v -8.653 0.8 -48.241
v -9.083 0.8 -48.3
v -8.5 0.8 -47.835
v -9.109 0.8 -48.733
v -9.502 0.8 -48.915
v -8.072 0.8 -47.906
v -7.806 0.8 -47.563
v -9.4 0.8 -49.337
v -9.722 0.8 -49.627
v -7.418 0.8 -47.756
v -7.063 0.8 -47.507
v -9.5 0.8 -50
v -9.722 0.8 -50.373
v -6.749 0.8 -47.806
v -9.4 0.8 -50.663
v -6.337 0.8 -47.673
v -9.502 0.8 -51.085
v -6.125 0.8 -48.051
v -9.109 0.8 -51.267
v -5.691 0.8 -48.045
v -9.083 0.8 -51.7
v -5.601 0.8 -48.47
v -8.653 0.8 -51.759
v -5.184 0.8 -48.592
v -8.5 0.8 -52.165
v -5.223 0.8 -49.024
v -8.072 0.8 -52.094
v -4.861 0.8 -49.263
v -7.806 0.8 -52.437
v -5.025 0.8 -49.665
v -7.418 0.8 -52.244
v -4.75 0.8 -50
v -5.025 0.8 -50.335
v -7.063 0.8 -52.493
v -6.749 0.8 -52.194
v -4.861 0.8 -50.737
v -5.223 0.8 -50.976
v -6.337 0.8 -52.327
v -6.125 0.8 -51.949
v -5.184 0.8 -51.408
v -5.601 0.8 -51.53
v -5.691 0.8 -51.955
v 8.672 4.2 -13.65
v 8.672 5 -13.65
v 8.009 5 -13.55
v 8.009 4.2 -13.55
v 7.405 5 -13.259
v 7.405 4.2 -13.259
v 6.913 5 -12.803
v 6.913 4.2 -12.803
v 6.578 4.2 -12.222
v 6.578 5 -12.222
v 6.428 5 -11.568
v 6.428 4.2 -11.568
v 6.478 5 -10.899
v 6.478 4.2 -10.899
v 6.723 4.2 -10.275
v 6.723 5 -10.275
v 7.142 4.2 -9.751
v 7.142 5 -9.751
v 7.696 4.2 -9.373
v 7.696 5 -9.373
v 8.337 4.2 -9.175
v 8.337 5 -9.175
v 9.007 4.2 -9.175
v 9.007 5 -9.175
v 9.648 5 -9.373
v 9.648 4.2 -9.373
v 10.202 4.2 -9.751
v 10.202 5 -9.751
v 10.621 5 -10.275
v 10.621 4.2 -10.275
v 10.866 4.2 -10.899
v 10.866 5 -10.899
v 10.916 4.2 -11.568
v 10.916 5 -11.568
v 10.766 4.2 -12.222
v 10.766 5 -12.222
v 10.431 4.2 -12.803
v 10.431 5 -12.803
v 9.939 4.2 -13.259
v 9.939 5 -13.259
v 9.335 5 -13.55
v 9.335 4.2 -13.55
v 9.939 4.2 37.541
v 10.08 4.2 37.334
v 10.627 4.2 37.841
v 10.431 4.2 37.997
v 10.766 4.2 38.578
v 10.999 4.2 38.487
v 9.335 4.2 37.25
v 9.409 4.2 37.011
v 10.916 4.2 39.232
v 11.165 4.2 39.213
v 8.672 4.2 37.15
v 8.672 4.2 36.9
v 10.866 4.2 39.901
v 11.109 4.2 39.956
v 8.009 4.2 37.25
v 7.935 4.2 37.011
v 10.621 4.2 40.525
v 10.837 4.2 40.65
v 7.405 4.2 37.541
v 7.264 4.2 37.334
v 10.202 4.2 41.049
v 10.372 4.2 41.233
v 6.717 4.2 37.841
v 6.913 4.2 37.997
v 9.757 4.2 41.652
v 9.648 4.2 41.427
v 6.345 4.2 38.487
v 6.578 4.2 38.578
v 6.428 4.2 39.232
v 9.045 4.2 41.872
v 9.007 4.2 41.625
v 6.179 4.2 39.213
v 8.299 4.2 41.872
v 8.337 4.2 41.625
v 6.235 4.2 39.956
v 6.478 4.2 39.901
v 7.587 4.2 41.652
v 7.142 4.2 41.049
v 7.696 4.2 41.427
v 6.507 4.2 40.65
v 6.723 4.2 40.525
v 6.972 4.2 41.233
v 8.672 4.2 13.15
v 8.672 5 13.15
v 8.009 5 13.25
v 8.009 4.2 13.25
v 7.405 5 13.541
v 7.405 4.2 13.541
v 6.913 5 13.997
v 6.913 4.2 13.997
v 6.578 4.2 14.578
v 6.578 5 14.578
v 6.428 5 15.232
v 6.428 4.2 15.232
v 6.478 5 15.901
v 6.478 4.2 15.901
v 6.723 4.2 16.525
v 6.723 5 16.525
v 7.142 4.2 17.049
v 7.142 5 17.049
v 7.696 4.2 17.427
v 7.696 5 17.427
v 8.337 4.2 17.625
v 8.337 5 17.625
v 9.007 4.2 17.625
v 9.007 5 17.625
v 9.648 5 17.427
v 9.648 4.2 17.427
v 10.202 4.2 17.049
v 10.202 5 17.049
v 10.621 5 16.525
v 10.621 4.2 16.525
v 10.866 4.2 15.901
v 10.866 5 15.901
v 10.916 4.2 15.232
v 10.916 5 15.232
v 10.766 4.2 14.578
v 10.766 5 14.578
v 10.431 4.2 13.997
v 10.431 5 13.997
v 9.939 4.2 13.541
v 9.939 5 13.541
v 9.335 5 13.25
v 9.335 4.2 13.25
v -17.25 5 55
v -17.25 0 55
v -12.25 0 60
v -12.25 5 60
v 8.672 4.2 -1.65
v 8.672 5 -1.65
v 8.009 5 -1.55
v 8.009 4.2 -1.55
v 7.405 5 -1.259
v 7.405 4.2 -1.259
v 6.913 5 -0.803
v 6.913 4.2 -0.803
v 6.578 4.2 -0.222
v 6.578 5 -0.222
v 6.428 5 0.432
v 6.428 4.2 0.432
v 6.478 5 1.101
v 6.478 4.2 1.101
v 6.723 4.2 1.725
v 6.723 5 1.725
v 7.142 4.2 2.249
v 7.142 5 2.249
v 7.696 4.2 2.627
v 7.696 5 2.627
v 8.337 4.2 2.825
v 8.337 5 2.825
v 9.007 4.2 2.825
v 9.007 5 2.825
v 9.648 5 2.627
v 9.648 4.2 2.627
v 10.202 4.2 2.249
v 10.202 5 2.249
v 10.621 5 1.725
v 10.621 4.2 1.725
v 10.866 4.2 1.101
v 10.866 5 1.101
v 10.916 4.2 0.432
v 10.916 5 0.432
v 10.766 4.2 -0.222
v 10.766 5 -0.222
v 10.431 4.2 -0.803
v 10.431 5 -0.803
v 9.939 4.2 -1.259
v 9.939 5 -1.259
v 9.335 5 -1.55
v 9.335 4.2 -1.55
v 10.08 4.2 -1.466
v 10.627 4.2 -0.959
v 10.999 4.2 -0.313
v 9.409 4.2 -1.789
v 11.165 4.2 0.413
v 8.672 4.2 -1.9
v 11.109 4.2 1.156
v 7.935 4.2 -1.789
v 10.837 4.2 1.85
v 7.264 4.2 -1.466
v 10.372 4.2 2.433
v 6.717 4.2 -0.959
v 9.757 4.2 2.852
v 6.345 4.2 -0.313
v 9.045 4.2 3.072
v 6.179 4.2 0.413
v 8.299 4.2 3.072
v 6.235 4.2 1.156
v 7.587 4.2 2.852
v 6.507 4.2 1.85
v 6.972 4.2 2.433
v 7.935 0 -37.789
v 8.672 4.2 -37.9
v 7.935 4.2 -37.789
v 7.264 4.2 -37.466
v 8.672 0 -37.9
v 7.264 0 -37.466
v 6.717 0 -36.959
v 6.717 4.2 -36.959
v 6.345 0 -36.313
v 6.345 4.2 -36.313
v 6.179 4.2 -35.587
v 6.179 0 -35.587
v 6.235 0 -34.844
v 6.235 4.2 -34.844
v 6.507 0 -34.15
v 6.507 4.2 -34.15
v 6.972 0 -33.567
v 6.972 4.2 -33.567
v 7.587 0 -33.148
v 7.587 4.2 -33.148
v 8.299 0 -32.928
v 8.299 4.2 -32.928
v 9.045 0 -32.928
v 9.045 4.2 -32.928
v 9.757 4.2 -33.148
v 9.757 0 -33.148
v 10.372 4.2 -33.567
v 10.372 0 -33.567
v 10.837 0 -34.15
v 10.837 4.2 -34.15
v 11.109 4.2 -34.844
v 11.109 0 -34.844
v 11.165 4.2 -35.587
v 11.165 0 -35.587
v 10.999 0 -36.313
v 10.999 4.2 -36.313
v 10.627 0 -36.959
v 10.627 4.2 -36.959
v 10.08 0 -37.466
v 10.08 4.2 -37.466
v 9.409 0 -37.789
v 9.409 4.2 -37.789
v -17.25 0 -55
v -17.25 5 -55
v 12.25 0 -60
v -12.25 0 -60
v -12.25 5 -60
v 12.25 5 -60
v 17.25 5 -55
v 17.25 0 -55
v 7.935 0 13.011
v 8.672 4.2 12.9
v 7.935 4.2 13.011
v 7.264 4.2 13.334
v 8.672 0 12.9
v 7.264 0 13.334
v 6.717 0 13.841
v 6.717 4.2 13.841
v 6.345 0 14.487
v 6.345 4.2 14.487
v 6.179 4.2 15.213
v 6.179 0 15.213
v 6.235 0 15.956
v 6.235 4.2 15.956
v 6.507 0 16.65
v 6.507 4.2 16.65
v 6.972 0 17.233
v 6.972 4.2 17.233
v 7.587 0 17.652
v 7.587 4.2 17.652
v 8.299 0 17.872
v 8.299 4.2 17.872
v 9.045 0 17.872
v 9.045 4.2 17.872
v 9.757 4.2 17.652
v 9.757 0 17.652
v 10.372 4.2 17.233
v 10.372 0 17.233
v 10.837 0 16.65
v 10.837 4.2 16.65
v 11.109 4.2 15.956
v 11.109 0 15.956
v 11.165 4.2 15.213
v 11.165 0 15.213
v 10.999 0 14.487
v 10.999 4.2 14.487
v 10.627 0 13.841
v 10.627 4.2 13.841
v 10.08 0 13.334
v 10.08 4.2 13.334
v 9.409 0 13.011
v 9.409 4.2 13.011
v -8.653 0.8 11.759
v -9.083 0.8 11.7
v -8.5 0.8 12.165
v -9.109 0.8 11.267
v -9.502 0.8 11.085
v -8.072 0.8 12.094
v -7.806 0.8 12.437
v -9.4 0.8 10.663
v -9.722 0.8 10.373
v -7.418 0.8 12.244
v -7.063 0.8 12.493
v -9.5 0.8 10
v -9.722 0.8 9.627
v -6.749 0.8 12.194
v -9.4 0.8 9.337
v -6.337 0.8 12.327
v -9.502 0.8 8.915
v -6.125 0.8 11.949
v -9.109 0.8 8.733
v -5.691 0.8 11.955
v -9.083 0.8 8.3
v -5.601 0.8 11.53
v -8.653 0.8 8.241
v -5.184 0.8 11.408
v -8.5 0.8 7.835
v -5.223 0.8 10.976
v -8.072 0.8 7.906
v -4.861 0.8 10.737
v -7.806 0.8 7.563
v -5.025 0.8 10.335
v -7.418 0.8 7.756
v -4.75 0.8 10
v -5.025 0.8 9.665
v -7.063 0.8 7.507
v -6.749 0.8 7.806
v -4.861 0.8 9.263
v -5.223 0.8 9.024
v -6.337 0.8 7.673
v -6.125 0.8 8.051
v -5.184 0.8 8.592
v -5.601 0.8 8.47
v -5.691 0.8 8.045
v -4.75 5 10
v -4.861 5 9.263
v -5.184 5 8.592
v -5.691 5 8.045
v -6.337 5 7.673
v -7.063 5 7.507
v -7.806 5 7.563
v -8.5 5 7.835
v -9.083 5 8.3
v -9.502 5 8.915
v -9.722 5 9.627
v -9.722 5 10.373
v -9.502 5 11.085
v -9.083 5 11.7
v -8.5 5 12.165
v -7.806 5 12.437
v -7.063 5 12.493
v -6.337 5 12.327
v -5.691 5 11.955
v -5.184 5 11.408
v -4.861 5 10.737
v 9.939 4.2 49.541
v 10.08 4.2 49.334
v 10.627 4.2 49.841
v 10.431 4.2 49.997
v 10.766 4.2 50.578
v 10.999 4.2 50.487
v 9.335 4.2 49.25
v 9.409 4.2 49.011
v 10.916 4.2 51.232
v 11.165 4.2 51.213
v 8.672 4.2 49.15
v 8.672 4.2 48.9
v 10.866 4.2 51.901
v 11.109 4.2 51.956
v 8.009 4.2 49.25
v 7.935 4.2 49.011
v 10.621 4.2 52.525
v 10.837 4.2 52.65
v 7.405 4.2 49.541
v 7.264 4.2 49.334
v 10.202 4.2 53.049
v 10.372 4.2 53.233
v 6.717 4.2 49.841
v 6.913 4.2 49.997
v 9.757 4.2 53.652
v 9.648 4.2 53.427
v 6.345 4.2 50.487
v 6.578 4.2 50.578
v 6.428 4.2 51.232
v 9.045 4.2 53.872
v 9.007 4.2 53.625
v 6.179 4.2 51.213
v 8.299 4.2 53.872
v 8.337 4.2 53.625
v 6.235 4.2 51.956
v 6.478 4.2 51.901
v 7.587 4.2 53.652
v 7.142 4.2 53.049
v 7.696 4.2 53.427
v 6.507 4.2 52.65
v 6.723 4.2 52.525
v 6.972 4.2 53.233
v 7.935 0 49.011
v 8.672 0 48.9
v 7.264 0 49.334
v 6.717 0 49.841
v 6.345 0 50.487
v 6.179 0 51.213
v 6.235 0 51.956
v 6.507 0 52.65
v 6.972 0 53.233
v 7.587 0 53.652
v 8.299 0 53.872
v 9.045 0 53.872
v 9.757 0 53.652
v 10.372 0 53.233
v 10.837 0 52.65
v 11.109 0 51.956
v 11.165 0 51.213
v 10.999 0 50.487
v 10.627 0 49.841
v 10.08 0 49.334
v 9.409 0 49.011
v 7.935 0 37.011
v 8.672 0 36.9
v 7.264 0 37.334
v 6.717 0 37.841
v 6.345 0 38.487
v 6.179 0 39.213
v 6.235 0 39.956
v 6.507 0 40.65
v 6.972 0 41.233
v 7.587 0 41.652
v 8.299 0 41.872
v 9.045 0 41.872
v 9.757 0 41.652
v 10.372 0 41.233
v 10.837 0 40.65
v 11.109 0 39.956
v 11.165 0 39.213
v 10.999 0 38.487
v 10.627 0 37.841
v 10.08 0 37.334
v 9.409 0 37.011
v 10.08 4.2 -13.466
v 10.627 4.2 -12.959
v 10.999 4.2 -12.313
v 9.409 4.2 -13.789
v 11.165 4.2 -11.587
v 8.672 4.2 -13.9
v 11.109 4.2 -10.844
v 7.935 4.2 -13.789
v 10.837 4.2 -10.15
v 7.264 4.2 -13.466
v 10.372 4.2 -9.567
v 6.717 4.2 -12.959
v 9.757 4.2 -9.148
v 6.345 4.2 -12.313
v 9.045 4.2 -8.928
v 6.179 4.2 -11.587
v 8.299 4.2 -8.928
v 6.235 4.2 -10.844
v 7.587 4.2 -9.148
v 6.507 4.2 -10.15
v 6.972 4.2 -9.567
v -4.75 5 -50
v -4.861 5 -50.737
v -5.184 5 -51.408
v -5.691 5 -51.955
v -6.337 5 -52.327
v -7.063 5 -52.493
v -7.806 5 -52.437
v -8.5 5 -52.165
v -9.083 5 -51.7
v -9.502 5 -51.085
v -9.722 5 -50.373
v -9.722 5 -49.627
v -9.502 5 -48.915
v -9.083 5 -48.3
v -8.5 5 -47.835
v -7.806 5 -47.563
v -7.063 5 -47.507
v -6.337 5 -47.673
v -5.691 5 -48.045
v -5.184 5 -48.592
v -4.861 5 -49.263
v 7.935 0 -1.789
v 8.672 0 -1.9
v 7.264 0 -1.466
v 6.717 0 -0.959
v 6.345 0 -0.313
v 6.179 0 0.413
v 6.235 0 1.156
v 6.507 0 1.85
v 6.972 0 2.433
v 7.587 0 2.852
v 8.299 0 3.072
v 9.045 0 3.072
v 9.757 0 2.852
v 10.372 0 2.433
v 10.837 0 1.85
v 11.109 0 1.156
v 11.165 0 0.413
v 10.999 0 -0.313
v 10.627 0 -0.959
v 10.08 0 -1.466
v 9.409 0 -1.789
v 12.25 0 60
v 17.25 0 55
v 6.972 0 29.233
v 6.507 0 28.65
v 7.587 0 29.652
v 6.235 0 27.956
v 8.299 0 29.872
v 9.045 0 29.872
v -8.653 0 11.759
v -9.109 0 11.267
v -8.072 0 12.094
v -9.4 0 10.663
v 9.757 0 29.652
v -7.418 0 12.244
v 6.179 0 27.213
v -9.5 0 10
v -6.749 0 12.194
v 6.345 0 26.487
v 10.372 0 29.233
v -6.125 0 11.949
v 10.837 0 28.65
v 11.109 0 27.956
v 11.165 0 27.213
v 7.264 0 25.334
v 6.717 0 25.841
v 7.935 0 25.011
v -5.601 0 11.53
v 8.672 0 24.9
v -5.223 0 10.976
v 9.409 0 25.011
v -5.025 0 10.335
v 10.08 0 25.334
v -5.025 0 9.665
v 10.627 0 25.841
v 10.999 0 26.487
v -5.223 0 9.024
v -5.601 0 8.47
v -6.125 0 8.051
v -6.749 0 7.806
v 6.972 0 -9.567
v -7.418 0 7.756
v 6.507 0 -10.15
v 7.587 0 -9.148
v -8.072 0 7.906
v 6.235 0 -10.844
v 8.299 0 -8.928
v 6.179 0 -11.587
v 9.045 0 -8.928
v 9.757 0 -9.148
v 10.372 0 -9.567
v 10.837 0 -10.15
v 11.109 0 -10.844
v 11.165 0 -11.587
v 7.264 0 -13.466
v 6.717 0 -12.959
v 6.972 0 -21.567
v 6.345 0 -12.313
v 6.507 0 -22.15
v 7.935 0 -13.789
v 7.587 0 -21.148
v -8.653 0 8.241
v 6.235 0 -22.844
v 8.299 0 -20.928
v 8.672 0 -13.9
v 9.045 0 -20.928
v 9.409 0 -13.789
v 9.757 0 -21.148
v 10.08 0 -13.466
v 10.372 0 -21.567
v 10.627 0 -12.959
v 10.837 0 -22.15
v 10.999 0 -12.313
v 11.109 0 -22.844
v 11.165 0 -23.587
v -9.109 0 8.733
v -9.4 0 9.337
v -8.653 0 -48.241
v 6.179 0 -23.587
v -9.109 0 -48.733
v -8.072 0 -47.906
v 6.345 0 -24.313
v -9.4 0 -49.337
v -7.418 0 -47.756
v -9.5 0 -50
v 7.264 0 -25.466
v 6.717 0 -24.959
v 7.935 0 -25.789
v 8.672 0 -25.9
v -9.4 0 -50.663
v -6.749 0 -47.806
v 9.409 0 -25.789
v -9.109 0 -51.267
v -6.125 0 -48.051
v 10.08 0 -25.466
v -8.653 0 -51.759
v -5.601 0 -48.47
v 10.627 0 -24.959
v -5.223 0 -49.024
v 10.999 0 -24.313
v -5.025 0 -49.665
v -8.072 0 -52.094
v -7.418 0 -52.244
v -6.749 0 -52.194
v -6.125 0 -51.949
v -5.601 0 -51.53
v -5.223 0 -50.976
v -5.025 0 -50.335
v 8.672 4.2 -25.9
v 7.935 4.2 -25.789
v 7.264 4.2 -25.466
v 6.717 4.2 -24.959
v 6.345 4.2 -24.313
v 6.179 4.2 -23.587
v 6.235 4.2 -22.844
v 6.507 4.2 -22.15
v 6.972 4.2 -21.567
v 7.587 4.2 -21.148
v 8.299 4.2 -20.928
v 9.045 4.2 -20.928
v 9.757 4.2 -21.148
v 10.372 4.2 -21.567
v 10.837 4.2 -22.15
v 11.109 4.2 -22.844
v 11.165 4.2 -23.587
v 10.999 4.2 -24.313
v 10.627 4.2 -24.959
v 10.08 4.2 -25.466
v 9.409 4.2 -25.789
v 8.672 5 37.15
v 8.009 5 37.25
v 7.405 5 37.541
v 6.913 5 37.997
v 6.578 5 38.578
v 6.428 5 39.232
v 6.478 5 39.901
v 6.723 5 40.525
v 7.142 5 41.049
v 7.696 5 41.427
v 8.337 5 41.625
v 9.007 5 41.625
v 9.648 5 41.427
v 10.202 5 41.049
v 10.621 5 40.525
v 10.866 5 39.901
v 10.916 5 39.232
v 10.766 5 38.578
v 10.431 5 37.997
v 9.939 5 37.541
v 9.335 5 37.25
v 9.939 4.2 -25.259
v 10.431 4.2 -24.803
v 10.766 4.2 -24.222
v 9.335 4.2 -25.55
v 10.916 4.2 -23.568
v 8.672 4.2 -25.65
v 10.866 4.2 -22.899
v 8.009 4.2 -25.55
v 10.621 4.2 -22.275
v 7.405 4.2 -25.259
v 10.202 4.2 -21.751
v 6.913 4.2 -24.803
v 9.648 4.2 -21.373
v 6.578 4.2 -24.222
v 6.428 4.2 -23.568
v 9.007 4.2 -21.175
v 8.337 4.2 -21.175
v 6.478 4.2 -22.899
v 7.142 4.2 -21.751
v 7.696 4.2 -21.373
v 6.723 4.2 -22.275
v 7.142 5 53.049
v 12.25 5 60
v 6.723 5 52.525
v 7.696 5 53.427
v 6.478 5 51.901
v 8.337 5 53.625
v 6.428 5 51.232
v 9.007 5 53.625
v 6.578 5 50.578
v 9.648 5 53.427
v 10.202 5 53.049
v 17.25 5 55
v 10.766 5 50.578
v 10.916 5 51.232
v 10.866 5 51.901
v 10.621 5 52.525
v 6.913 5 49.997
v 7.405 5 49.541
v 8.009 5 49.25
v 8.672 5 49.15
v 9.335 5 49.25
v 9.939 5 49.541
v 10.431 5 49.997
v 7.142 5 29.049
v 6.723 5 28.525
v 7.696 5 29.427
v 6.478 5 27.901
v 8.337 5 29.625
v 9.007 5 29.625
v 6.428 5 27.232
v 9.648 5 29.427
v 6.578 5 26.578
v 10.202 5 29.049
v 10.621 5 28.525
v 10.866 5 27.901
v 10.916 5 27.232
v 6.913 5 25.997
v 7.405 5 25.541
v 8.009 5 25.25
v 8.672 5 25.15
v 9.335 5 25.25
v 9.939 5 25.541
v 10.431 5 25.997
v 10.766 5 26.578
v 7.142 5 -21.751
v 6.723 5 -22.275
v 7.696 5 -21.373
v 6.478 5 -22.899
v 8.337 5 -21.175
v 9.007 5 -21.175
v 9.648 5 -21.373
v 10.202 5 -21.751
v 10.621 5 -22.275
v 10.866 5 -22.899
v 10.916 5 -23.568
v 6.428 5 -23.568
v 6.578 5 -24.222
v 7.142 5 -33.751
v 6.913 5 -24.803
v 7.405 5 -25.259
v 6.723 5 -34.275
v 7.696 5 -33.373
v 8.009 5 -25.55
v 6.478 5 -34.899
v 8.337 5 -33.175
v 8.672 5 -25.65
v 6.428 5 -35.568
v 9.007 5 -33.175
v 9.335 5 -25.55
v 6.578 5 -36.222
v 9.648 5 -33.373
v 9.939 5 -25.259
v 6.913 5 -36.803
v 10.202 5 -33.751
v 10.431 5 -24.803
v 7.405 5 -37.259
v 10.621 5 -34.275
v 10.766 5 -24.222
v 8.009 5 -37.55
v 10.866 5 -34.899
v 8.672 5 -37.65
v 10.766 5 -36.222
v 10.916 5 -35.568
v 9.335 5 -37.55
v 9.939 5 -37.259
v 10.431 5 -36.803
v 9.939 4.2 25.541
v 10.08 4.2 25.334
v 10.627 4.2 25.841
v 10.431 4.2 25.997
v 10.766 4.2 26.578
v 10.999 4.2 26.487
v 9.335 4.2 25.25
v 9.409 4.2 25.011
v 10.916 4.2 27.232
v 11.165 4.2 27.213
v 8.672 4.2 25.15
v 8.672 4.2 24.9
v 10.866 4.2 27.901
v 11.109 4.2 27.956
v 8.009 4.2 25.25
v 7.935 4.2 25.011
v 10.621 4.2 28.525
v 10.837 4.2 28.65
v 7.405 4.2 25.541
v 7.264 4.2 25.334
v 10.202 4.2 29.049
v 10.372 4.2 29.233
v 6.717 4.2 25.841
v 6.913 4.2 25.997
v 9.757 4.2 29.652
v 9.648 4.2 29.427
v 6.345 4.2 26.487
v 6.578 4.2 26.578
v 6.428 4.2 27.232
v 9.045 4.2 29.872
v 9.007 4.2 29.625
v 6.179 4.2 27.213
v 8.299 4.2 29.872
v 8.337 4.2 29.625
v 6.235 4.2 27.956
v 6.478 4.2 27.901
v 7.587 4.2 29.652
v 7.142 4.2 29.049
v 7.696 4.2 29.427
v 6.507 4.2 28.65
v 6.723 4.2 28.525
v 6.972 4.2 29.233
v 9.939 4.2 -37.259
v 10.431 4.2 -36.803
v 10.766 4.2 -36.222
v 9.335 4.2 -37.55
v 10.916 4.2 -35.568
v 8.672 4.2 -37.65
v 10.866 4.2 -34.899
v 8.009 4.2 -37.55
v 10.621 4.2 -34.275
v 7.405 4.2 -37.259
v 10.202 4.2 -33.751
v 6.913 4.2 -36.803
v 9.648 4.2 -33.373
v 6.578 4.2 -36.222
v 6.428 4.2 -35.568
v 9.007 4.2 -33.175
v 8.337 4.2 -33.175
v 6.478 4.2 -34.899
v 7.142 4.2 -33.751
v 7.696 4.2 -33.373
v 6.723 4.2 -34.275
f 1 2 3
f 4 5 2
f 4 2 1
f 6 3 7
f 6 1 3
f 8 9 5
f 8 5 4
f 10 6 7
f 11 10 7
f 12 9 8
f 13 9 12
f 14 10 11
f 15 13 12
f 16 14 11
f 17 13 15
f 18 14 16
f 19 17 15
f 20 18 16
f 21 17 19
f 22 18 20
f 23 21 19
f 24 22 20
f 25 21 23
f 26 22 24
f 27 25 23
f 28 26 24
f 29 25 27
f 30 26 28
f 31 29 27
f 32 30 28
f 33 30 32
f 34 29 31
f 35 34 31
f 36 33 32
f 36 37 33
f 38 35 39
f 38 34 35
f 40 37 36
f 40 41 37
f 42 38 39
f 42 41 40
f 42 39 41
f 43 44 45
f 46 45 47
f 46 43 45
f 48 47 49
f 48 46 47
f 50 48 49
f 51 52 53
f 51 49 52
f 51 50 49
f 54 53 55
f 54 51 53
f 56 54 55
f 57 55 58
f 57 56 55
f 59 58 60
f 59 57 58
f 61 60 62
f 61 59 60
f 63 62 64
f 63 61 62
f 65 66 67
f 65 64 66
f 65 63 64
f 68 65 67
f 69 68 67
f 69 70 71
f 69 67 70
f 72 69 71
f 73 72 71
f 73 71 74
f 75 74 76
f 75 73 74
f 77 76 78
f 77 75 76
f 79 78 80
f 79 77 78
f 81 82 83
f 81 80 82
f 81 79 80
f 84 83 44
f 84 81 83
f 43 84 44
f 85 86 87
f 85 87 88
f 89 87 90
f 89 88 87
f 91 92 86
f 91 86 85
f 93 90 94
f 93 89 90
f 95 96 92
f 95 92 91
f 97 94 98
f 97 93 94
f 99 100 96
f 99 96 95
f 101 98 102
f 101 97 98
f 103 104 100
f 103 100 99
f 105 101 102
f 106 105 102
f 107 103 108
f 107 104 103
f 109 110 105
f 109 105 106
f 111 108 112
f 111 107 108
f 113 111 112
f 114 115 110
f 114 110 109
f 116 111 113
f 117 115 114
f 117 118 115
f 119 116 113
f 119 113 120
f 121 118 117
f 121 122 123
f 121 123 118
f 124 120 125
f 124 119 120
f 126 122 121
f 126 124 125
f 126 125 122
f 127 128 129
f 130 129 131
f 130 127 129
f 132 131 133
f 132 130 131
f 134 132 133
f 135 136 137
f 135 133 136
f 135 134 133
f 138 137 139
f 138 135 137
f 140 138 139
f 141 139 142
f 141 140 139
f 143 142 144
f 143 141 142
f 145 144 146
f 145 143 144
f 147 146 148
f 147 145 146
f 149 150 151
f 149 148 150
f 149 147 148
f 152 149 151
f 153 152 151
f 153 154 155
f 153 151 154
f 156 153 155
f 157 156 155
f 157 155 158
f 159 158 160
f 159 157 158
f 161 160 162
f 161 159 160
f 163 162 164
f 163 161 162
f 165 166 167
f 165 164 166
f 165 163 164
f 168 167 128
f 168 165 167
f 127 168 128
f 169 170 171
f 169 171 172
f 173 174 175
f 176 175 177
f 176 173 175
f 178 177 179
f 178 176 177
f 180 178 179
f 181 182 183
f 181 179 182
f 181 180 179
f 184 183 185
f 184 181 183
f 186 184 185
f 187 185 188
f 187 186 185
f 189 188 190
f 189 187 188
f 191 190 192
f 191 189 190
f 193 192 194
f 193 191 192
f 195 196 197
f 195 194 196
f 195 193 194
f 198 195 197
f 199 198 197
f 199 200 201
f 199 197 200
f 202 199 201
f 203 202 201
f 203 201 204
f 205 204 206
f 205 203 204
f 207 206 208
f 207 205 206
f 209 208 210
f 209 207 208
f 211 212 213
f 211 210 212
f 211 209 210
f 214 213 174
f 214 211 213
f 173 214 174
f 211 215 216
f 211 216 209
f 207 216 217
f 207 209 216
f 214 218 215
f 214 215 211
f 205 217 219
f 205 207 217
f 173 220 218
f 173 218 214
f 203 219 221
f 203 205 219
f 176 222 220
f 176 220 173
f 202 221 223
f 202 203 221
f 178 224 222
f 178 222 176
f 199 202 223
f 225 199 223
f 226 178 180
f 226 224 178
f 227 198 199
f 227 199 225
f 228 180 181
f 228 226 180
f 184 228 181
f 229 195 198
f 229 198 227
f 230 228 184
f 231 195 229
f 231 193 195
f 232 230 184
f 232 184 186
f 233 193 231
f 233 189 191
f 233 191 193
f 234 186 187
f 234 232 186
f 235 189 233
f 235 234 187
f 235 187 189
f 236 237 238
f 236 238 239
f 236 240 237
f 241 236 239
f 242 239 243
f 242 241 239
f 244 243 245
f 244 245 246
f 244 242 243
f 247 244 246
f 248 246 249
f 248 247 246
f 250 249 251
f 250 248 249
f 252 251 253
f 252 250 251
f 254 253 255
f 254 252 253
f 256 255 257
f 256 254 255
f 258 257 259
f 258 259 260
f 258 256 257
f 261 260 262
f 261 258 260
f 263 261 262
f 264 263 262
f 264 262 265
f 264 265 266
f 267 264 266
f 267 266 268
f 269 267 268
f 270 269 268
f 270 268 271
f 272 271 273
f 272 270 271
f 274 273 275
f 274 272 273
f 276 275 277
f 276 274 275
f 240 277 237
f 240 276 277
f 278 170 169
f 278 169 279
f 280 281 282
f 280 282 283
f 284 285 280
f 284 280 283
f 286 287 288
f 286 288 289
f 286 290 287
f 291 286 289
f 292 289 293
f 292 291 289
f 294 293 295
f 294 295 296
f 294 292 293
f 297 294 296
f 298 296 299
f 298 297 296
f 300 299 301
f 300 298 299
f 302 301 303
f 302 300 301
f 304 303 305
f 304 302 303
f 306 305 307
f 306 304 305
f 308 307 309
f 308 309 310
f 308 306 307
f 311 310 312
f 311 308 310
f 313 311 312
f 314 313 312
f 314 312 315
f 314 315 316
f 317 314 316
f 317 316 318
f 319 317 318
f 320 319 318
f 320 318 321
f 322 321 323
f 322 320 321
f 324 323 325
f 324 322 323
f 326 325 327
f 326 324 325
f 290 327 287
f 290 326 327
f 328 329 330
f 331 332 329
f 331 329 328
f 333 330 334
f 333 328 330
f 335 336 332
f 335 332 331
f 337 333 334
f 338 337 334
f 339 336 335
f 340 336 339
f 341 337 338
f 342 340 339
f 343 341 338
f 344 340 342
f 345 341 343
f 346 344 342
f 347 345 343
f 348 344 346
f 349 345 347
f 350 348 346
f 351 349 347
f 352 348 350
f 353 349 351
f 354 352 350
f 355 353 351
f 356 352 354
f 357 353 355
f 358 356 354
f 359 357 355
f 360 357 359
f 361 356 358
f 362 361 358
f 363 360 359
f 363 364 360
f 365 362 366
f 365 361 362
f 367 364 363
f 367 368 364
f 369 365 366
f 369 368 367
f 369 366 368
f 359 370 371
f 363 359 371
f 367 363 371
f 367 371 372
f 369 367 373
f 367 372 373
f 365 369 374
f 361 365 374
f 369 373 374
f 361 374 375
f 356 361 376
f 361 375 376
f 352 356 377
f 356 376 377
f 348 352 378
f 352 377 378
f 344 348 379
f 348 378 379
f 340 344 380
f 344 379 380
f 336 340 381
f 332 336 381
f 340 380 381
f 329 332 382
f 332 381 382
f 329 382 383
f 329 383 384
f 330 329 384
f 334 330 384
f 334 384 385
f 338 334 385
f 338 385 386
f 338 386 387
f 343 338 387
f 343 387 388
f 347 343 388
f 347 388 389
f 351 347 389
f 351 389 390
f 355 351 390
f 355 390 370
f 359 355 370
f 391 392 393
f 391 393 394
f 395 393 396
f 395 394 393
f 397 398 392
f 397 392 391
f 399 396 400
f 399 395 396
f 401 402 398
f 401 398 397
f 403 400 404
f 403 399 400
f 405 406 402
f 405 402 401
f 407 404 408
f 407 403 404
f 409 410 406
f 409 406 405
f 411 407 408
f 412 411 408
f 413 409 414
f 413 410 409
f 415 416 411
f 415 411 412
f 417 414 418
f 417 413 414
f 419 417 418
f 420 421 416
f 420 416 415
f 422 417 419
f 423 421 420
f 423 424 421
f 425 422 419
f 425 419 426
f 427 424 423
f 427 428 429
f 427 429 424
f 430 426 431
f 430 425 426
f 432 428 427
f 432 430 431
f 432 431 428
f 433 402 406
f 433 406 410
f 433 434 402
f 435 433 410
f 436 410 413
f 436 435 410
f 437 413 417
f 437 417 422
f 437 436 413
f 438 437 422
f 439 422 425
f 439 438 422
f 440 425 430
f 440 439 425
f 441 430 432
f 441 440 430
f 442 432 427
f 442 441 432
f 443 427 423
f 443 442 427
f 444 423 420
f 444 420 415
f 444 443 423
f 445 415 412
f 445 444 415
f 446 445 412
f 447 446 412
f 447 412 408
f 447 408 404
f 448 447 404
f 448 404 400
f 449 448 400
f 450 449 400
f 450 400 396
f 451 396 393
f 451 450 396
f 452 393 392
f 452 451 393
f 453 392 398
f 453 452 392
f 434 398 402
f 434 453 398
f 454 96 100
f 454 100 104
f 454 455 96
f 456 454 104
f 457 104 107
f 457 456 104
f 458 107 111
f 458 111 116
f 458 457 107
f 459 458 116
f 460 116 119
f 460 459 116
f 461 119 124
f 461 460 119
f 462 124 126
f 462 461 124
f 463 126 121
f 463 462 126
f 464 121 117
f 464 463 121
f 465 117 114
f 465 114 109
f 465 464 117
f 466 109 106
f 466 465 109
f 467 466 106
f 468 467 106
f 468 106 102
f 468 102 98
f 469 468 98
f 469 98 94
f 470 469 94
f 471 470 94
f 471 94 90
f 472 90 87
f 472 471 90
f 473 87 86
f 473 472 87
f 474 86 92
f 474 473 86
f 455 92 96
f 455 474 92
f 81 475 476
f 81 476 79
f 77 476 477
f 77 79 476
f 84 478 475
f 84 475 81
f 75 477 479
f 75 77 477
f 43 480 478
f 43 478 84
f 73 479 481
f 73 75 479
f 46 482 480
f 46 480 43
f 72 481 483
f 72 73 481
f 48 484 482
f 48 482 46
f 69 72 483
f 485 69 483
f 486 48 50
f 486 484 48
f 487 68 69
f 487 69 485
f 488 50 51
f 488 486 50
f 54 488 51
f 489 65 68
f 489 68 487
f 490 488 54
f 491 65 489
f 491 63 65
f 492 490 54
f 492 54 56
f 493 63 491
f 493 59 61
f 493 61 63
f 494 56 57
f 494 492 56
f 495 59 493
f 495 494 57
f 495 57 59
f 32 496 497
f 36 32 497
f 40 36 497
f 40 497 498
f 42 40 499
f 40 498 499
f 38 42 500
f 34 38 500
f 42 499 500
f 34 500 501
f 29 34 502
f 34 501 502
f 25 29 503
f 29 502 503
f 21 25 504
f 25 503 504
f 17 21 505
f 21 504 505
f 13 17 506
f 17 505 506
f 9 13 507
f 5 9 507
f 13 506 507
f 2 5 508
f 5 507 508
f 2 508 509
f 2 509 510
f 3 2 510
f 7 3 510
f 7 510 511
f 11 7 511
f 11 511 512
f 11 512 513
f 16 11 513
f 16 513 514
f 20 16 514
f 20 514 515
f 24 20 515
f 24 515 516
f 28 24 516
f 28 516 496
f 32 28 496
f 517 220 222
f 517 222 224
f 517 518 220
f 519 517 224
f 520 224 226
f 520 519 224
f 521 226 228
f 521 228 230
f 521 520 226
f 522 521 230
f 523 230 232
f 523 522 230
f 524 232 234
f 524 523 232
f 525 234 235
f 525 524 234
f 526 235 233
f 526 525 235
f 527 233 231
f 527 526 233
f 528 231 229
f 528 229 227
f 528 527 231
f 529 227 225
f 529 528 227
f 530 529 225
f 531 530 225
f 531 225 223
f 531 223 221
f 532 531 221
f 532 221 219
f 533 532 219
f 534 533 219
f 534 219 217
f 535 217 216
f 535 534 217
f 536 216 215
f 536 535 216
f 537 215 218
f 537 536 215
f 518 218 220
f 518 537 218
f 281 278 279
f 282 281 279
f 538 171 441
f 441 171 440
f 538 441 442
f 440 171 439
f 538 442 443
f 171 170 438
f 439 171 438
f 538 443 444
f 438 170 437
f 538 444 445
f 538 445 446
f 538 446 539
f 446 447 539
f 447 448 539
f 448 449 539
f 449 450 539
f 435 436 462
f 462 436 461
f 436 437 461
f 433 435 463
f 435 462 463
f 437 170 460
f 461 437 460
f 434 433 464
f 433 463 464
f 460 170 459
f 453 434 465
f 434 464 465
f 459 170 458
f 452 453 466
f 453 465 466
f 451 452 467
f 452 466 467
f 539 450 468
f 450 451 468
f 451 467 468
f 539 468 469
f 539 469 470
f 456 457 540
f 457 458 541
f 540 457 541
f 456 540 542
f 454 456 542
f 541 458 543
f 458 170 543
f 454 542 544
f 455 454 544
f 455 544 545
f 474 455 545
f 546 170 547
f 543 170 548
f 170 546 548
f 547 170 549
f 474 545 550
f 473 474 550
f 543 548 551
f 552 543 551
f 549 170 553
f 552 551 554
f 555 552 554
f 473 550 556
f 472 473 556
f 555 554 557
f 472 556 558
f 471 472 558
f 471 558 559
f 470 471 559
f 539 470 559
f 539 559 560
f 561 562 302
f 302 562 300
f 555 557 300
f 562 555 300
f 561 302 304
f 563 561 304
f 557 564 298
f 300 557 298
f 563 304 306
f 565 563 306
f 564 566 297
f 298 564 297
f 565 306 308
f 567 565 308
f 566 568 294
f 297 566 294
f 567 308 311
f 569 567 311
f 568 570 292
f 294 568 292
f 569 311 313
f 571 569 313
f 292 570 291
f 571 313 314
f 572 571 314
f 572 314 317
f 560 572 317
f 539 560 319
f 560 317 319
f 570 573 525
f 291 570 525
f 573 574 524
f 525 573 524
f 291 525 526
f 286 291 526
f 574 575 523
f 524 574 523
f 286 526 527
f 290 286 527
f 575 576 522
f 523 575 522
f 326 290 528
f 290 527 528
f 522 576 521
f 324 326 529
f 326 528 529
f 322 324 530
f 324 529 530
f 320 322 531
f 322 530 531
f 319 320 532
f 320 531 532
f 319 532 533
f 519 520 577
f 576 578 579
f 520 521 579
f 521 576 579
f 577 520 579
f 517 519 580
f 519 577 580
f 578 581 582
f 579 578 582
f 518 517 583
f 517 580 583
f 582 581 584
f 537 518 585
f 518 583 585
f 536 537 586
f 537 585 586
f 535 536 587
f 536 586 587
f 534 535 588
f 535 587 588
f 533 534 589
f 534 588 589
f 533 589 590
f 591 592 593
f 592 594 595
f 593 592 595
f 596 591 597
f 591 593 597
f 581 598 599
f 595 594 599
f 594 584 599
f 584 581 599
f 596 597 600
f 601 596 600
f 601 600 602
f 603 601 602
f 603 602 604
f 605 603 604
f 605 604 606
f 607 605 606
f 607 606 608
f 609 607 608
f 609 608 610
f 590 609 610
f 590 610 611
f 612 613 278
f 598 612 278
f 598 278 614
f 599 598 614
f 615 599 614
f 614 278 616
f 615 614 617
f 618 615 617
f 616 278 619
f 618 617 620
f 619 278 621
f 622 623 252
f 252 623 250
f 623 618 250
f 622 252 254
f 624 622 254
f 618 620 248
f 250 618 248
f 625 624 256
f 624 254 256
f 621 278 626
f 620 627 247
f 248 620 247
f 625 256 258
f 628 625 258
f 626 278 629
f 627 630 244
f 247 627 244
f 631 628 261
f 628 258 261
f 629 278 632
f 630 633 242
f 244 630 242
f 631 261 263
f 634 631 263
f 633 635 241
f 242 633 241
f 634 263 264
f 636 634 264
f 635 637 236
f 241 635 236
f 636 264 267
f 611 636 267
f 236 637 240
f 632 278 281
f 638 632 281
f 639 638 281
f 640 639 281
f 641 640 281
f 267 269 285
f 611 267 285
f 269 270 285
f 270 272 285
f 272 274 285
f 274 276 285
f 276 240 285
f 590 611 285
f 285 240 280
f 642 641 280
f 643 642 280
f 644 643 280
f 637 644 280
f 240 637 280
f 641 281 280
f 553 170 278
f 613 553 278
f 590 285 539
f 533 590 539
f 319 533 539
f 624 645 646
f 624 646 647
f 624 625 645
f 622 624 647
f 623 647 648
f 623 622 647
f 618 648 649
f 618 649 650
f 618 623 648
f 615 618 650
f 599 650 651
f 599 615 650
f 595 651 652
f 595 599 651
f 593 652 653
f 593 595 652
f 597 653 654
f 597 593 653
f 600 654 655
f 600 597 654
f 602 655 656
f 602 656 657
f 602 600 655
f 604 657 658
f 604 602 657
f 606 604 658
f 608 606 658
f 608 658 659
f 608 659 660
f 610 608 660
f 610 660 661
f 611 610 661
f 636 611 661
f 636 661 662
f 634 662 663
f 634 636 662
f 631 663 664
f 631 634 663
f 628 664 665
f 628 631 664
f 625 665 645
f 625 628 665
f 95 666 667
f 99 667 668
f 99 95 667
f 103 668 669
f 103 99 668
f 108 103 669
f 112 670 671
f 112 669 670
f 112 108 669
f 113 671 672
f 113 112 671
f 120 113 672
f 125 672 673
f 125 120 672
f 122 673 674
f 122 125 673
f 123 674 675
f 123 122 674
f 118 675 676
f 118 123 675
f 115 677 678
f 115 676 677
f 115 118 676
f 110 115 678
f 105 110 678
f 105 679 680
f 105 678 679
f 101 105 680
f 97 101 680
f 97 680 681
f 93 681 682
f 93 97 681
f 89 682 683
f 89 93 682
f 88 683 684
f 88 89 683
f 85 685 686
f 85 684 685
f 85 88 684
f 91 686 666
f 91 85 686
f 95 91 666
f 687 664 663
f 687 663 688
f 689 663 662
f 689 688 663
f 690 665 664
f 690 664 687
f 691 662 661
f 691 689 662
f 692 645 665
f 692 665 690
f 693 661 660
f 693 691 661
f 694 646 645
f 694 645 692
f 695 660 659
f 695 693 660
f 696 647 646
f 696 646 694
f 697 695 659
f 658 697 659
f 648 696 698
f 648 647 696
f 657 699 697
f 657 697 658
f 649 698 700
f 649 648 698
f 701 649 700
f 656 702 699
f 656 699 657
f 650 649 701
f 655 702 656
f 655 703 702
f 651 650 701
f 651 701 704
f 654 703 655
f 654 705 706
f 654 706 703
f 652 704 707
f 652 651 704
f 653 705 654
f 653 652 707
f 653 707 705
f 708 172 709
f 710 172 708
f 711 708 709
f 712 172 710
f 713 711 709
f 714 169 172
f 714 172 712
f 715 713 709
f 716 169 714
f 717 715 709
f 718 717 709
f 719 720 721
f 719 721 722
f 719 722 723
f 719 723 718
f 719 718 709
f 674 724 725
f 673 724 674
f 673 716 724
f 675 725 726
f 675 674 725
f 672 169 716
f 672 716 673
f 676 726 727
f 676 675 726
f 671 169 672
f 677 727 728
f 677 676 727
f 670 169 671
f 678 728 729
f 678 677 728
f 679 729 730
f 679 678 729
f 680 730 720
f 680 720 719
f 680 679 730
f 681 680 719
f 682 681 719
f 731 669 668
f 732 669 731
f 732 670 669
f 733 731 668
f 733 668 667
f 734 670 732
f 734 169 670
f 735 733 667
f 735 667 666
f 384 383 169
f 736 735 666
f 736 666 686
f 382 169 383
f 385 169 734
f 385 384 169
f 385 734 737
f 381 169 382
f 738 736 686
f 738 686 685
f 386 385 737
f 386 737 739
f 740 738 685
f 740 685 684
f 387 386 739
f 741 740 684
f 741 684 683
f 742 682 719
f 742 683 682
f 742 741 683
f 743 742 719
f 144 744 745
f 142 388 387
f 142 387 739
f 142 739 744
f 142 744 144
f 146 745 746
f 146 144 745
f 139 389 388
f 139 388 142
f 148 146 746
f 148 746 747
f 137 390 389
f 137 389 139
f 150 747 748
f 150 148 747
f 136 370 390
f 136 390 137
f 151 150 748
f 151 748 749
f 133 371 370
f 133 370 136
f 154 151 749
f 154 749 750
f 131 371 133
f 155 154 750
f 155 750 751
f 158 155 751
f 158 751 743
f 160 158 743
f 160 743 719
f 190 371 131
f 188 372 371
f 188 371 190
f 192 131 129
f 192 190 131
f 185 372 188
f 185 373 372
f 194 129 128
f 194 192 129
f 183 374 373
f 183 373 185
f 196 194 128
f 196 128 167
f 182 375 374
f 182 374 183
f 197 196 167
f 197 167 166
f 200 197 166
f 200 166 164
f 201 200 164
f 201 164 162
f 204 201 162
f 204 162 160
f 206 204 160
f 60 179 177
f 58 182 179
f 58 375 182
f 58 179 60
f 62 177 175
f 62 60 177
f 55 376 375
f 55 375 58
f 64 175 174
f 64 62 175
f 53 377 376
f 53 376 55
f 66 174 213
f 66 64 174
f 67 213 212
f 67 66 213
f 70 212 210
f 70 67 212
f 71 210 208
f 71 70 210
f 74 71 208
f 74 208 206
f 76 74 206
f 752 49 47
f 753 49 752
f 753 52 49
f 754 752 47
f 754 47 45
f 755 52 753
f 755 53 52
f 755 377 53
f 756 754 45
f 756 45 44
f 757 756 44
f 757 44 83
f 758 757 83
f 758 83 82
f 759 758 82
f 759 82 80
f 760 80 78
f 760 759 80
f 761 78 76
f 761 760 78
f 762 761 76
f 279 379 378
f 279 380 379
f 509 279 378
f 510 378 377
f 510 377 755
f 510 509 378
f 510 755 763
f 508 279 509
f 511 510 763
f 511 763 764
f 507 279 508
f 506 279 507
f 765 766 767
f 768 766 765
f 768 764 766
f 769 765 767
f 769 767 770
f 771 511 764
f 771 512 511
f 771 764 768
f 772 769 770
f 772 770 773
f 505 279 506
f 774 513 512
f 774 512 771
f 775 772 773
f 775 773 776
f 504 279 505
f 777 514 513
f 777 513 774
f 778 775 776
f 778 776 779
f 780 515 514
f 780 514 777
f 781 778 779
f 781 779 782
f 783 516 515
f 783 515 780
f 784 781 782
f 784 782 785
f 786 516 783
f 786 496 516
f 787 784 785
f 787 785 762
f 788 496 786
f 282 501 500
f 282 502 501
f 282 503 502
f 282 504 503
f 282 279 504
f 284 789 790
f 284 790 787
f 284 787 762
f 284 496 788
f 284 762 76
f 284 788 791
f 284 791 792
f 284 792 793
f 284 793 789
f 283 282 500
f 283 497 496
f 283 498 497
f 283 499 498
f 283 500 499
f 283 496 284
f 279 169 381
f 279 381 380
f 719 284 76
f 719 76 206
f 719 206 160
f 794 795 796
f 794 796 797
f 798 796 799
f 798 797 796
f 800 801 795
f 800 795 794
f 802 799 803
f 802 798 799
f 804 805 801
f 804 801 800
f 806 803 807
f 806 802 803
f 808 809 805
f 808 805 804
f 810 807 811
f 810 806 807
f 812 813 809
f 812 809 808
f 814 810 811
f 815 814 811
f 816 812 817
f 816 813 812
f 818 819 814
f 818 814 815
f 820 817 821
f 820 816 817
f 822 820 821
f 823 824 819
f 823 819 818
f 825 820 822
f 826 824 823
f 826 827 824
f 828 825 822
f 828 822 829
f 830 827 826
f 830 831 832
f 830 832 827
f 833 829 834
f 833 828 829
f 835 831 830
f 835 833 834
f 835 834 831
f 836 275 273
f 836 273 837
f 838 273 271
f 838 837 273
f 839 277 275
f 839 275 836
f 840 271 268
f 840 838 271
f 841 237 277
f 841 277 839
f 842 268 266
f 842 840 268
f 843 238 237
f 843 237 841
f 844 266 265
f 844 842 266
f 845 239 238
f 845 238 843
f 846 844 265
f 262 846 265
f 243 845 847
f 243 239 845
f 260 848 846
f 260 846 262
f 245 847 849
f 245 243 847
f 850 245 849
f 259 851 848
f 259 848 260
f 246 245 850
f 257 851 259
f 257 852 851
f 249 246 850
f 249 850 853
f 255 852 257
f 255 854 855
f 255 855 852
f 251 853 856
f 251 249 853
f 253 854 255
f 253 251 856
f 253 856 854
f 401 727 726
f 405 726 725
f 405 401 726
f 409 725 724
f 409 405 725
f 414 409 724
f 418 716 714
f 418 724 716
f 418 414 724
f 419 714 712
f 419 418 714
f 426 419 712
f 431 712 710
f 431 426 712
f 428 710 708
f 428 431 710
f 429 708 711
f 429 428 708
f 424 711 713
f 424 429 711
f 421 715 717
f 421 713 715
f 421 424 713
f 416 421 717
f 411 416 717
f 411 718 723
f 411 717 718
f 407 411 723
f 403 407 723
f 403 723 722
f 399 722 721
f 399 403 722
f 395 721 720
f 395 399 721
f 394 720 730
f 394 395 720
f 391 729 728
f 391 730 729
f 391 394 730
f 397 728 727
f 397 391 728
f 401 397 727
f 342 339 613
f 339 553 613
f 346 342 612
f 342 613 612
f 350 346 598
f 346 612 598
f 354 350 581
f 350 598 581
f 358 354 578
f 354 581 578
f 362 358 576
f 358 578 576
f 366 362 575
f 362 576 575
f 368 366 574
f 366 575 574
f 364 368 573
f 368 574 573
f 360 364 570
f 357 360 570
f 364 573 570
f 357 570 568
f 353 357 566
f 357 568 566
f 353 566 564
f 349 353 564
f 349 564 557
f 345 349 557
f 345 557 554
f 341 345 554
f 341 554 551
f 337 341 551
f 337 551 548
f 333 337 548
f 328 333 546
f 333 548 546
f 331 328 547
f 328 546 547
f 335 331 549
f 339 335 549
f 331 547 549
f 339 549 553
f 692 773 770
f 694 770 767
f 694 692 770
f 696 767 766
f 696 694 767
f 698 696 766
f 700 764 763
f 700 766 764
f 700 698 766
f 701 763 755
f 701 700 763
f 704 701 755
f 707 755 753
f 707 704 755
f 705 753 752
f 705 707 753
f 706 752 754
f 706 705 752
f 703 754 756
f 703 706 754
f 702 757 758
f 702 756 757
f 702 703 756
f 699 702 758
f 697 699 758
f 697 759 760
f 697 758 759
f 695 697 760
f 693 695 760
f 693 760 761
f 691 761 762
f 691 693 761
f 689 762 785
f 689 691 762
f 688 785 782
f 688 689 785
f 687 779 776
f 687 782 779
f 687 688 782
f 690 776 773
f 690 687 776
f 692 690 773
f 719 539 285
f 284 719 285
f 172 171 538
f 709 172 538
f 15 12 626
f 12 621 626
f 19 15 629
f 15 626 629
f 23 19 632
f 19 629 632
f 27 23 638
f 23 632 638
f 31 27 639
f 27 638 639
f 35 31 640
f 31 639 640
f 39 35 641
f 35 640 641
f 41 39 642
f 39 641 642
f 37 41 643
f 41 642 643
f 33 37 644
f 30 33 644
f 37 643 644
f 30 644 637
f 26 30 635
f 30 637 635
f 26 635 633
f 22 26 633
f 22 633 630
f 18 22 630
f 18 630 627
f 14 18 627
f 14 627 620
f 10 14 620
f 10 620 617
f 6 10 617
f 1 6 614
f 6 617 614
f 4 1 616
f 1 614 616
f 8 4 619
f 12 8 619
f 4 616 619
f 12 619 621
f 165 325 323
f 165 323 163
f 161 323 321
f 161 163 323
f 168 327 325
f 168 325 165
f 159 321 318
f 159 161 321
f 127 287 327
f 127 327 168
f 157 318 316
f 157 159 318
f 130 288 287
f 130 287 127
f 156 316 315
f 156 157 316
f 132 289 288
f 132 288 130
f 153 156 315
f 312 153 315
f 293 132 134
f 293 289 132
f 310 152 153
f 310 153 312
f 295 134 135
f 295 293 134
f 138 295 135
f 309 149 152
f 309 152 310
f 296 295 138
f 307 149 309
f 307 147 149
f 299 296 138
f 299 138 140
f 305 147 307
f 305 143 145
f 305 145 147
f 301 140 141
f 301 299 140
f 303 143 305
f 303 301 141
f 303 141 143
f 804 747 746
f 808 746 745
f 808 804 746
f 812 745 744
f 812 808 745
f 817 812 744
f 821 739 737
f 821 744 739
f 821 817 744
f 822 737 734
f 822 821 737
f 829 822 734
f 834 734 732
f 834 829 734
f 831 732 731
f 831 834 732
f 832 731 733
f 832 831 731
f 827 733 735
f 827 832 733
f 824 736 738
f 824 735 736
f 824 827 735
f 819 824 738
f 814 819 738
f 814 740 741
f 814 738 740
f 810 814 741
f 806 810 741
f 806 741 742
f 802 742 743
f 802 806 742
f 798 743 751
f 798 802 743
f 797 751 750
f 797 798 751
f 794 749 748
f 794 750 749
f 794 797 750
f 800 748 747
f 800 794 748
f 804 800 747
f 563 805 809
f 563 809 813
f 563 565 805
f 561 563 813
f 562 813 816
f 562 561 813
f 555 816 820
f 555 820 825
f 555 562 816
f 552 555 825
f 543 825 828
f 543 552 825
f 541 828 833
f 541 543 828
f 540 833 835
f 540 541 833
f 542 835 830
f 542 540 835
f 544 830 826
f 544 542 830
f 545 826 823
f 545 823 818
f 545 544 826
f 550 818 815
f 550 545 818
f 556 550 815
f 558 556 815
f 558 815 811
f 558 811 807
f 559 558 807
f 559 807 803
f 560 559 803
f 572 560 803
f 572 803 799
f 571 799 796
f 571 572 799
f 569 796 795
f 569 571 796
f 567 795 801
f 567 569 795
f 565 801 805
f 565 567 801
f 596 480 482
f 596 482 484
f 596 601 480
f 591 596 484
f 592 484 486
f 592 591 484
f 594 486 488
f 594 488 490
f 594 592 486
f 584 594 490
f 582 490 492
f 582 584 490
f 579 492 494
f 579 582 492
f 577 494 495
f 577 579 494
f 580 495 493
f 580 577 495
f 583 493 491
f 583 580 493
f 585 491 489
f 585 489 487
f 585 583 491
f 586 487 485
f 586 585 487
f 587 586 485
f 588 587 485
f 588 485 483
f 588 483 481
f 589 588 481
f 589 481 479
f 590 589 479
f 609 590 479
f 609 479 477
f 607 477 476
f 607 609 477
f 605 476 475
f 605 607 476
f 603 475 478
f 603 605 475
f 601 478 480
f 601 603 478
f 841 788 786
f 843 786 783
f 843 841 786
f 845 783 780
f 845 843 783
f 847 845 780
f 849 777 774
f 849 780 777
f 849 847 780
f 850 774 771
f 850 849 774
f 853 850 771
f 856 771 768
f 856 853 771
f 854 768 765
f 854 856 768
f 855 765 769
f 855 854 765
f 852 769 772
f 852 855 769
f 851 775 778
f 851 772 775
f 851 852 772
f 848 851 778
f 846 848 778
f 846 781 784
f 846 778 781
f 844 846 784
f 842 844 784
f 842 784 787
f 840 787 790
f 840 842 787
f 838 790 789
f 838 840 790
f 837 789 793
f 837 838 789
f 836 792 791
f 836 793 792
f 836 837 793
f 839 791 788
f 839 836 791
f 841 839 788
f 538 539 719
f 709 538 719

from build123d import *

# Parameters (mm, degrees)
SKETCH1_W                                        = 34.5
SKETCH1_H                                        = 120
BOSS_EXTRUDE1_DEPTH                              = 5
CBORE_FOR_M4_HEX_HEAD_MACHINE_SCREW2_D           = 4.5
CBORE_FOR_M4_HEX_HEAD_MACHINE_SCREW2_DEPTH       = 12
CBORE_FOR_M4_HEX_HEAD_MACHINE_SCREW2_CBORE_D     = 5
CBORE_FOR_M4_HEX_HEAD_MACHINE_SCREW2_CBORE_DEPTH = 4.2
CBORE_FOR_M4_HEX_HEAD_MACHINE_SCREW2_TIP         = 1.351936393
CBORE_FOR_M4_HEX_HEAD_MACHINE_SCREW3_AT_COUNT    = 2
CBORE_FOR_M4_HEX_HEAD_MACHINE_SCREW3_AT_PITCH    = 50.8
LPATTERN1_COUNT                                  = 4
LPATTERN1_PITCH                                  = 12
CHAMFER1_SIZE                                    = 5


with BuildPart() as part:
    # Sketch1 → Boss-Extrude1 (new body)
    with BuildSketch(Plane(origin=(0, 0, 0), x_dir=(1, 0, 0), z_dir=(0, 1, 0))):
        Rectangle(SKETCH1_W, SKETCH1_H)
    extrude(amount=BOSS_EXTRUDE1_DEPTH)

    # CBORE for M4 Hex Head Machine Screw2
    with Locations(Plane(origin=(0, 5, 0), x_dir=(1, 0, 0), z_dir=(0, 1, 0))):
        with Locations((-7.25, 50), (-7.25, -10)):
            CounterBoreHole(CBORE_FOR_M4_HEX_HEAD_MACHINE_SCREW2_D / 2, CBORE_FOR_M4_HEX_HEAD_MACHINE_SCREW2_CBORE_D / 2, CBORE_FOR_M4_HEX_HEAD_MACHINE_SCREW2_CBORE_DEPTH, depth=CBORE_FOR_M4_HEX_HEAD_MACHINE_SCREW2_DEPTH)
            with Locations((0, 0, -(CBORE_FOR_M4_HEX_HEAD_MACHINE_SCREW2_DEPTH + CBORE_FOR_M4_HEX_HEAD_MACHINE_SCREW2_TIP / 2))):  # 118° drill point
                Cone(0, CBORE_FOR_M4_HEX_HEAD_MACHINE_SCREW2_D / 2, CBORE_FOR_M4_HEX_HEAD_MACHINE_SCREW2_TIP, mode=Mode.SUBTRACT)

    # Sketch6 → CBORE for M4 Hex Head Machine Screw3 (revolve, cut)
    with BuildSketch(Plane(origin=(8.672, 0, -35.4), x_dir=(0, 0, -1), z_dir=(1, 0, 0))):
        Polygon((0, 0), (0, 13.351936393), (2.25, 12), (2.25, 4.2), (2.5, 4.2), (2.5, 0), align=None)
    cbore_for_m4_hex_head_machine_screw3 = revolve(axis=Axis((8.672, -6.35, -35.4), (0, 1, 0)), mode=Mode.SUBTRACT)

    # CBORE for M4 Hex Head Machine Screw3 at: CBORE for M4 Hex Head Machine Screw3 ×2
    with Locations(*[(0, 0, i * CBORE_FOR_M4_HEX_HEAD_MACHINE_SCREW3_AT_PITCH) for i in range(1, CBORE_FOR_M4_HEX_HEAD_MACHINE_SCREW3_AT_COUNT)]):
        add(cbore_for_m4_hex_head_machine_screw3, mode=Mode.SUBTRACT)

    # LPattern1: CBORE for M4 Hex Head Machine Screw3 ×4
    with Locations(*[(0, 0, i * LPATTERN1_PITCH) for i in range(1, LPATTERN1_COUNT)]):
        add(cbore_for_m4_hex_head_machine_screw3, mode=Mode.SUBTRACT)

    # LPattern1 copy 1 sketch → LPattern1 copy 1 (revolve, cut)
    with BuildSketch(Plane(origin=(8.672, 0, 27.4), x_dir=(0, 0, -1), z_dir=(1, 0, 0))):
        Polygon((0, 0), (0, 13.351936393), (2.25, 12), (2.25, 4.2), (2.5, 4.2), (2.5, 0), align=None)
    revolve(axis=Axis((8.672, -6.35, 27.4), (0, 1, 0)), mode=Mode.SUBTRACT)

    # LPattern1 copy 2 sketch → LPattern1 copy 2 (revolve, cut)
    with BuildSketch(Plane(origin=(8.672, 0, 39.4), x_dir=(0, 0, -1), z_dir=(1, 0, 0))):
        Polygon((0, 0), (0, 13.351936393), (2.25, 12), (2.25, 4.2), (2.5, 4.2), (2.5, 0), align=None)
    revolve(axis=Axis((8.672, -6.35, 39.4), (0, 1, 0)), mode=Mode.SUBTRACT)

    # LPattern1 copy 3 sketch → LPattern1 copy 3 (revolve, cut)
    with BuildSketch(Plane(origin=(8.672, 0, 51.4), x_dir=(0, 0, -1), z_dir=(1, 0, 0))):
        Polygon((0, 0), (0, 13.351936393), (2.25, 12), (2.25, 4.2), (2.5, 4.2), (2.5, 0), align=None)
    revolve(axis=Axis((8.672, -6.35, 51.4), (0, 1, 0)), mode=Mode.SUBTRACT)

    # Chamfer1
    chamfer1_edges = [part.edges().sort_by_distance(p)[0] for p in [
        (17.25, 2.5, 60),
        (-17.25, 2.5, 60),
        (-17.25, 2.5, -60),
        (17.25, 2.5, -60),
    ]]
    chamfer(chamfer1_edges, length=CHAMFER1_SIZE)


solid = part.part
